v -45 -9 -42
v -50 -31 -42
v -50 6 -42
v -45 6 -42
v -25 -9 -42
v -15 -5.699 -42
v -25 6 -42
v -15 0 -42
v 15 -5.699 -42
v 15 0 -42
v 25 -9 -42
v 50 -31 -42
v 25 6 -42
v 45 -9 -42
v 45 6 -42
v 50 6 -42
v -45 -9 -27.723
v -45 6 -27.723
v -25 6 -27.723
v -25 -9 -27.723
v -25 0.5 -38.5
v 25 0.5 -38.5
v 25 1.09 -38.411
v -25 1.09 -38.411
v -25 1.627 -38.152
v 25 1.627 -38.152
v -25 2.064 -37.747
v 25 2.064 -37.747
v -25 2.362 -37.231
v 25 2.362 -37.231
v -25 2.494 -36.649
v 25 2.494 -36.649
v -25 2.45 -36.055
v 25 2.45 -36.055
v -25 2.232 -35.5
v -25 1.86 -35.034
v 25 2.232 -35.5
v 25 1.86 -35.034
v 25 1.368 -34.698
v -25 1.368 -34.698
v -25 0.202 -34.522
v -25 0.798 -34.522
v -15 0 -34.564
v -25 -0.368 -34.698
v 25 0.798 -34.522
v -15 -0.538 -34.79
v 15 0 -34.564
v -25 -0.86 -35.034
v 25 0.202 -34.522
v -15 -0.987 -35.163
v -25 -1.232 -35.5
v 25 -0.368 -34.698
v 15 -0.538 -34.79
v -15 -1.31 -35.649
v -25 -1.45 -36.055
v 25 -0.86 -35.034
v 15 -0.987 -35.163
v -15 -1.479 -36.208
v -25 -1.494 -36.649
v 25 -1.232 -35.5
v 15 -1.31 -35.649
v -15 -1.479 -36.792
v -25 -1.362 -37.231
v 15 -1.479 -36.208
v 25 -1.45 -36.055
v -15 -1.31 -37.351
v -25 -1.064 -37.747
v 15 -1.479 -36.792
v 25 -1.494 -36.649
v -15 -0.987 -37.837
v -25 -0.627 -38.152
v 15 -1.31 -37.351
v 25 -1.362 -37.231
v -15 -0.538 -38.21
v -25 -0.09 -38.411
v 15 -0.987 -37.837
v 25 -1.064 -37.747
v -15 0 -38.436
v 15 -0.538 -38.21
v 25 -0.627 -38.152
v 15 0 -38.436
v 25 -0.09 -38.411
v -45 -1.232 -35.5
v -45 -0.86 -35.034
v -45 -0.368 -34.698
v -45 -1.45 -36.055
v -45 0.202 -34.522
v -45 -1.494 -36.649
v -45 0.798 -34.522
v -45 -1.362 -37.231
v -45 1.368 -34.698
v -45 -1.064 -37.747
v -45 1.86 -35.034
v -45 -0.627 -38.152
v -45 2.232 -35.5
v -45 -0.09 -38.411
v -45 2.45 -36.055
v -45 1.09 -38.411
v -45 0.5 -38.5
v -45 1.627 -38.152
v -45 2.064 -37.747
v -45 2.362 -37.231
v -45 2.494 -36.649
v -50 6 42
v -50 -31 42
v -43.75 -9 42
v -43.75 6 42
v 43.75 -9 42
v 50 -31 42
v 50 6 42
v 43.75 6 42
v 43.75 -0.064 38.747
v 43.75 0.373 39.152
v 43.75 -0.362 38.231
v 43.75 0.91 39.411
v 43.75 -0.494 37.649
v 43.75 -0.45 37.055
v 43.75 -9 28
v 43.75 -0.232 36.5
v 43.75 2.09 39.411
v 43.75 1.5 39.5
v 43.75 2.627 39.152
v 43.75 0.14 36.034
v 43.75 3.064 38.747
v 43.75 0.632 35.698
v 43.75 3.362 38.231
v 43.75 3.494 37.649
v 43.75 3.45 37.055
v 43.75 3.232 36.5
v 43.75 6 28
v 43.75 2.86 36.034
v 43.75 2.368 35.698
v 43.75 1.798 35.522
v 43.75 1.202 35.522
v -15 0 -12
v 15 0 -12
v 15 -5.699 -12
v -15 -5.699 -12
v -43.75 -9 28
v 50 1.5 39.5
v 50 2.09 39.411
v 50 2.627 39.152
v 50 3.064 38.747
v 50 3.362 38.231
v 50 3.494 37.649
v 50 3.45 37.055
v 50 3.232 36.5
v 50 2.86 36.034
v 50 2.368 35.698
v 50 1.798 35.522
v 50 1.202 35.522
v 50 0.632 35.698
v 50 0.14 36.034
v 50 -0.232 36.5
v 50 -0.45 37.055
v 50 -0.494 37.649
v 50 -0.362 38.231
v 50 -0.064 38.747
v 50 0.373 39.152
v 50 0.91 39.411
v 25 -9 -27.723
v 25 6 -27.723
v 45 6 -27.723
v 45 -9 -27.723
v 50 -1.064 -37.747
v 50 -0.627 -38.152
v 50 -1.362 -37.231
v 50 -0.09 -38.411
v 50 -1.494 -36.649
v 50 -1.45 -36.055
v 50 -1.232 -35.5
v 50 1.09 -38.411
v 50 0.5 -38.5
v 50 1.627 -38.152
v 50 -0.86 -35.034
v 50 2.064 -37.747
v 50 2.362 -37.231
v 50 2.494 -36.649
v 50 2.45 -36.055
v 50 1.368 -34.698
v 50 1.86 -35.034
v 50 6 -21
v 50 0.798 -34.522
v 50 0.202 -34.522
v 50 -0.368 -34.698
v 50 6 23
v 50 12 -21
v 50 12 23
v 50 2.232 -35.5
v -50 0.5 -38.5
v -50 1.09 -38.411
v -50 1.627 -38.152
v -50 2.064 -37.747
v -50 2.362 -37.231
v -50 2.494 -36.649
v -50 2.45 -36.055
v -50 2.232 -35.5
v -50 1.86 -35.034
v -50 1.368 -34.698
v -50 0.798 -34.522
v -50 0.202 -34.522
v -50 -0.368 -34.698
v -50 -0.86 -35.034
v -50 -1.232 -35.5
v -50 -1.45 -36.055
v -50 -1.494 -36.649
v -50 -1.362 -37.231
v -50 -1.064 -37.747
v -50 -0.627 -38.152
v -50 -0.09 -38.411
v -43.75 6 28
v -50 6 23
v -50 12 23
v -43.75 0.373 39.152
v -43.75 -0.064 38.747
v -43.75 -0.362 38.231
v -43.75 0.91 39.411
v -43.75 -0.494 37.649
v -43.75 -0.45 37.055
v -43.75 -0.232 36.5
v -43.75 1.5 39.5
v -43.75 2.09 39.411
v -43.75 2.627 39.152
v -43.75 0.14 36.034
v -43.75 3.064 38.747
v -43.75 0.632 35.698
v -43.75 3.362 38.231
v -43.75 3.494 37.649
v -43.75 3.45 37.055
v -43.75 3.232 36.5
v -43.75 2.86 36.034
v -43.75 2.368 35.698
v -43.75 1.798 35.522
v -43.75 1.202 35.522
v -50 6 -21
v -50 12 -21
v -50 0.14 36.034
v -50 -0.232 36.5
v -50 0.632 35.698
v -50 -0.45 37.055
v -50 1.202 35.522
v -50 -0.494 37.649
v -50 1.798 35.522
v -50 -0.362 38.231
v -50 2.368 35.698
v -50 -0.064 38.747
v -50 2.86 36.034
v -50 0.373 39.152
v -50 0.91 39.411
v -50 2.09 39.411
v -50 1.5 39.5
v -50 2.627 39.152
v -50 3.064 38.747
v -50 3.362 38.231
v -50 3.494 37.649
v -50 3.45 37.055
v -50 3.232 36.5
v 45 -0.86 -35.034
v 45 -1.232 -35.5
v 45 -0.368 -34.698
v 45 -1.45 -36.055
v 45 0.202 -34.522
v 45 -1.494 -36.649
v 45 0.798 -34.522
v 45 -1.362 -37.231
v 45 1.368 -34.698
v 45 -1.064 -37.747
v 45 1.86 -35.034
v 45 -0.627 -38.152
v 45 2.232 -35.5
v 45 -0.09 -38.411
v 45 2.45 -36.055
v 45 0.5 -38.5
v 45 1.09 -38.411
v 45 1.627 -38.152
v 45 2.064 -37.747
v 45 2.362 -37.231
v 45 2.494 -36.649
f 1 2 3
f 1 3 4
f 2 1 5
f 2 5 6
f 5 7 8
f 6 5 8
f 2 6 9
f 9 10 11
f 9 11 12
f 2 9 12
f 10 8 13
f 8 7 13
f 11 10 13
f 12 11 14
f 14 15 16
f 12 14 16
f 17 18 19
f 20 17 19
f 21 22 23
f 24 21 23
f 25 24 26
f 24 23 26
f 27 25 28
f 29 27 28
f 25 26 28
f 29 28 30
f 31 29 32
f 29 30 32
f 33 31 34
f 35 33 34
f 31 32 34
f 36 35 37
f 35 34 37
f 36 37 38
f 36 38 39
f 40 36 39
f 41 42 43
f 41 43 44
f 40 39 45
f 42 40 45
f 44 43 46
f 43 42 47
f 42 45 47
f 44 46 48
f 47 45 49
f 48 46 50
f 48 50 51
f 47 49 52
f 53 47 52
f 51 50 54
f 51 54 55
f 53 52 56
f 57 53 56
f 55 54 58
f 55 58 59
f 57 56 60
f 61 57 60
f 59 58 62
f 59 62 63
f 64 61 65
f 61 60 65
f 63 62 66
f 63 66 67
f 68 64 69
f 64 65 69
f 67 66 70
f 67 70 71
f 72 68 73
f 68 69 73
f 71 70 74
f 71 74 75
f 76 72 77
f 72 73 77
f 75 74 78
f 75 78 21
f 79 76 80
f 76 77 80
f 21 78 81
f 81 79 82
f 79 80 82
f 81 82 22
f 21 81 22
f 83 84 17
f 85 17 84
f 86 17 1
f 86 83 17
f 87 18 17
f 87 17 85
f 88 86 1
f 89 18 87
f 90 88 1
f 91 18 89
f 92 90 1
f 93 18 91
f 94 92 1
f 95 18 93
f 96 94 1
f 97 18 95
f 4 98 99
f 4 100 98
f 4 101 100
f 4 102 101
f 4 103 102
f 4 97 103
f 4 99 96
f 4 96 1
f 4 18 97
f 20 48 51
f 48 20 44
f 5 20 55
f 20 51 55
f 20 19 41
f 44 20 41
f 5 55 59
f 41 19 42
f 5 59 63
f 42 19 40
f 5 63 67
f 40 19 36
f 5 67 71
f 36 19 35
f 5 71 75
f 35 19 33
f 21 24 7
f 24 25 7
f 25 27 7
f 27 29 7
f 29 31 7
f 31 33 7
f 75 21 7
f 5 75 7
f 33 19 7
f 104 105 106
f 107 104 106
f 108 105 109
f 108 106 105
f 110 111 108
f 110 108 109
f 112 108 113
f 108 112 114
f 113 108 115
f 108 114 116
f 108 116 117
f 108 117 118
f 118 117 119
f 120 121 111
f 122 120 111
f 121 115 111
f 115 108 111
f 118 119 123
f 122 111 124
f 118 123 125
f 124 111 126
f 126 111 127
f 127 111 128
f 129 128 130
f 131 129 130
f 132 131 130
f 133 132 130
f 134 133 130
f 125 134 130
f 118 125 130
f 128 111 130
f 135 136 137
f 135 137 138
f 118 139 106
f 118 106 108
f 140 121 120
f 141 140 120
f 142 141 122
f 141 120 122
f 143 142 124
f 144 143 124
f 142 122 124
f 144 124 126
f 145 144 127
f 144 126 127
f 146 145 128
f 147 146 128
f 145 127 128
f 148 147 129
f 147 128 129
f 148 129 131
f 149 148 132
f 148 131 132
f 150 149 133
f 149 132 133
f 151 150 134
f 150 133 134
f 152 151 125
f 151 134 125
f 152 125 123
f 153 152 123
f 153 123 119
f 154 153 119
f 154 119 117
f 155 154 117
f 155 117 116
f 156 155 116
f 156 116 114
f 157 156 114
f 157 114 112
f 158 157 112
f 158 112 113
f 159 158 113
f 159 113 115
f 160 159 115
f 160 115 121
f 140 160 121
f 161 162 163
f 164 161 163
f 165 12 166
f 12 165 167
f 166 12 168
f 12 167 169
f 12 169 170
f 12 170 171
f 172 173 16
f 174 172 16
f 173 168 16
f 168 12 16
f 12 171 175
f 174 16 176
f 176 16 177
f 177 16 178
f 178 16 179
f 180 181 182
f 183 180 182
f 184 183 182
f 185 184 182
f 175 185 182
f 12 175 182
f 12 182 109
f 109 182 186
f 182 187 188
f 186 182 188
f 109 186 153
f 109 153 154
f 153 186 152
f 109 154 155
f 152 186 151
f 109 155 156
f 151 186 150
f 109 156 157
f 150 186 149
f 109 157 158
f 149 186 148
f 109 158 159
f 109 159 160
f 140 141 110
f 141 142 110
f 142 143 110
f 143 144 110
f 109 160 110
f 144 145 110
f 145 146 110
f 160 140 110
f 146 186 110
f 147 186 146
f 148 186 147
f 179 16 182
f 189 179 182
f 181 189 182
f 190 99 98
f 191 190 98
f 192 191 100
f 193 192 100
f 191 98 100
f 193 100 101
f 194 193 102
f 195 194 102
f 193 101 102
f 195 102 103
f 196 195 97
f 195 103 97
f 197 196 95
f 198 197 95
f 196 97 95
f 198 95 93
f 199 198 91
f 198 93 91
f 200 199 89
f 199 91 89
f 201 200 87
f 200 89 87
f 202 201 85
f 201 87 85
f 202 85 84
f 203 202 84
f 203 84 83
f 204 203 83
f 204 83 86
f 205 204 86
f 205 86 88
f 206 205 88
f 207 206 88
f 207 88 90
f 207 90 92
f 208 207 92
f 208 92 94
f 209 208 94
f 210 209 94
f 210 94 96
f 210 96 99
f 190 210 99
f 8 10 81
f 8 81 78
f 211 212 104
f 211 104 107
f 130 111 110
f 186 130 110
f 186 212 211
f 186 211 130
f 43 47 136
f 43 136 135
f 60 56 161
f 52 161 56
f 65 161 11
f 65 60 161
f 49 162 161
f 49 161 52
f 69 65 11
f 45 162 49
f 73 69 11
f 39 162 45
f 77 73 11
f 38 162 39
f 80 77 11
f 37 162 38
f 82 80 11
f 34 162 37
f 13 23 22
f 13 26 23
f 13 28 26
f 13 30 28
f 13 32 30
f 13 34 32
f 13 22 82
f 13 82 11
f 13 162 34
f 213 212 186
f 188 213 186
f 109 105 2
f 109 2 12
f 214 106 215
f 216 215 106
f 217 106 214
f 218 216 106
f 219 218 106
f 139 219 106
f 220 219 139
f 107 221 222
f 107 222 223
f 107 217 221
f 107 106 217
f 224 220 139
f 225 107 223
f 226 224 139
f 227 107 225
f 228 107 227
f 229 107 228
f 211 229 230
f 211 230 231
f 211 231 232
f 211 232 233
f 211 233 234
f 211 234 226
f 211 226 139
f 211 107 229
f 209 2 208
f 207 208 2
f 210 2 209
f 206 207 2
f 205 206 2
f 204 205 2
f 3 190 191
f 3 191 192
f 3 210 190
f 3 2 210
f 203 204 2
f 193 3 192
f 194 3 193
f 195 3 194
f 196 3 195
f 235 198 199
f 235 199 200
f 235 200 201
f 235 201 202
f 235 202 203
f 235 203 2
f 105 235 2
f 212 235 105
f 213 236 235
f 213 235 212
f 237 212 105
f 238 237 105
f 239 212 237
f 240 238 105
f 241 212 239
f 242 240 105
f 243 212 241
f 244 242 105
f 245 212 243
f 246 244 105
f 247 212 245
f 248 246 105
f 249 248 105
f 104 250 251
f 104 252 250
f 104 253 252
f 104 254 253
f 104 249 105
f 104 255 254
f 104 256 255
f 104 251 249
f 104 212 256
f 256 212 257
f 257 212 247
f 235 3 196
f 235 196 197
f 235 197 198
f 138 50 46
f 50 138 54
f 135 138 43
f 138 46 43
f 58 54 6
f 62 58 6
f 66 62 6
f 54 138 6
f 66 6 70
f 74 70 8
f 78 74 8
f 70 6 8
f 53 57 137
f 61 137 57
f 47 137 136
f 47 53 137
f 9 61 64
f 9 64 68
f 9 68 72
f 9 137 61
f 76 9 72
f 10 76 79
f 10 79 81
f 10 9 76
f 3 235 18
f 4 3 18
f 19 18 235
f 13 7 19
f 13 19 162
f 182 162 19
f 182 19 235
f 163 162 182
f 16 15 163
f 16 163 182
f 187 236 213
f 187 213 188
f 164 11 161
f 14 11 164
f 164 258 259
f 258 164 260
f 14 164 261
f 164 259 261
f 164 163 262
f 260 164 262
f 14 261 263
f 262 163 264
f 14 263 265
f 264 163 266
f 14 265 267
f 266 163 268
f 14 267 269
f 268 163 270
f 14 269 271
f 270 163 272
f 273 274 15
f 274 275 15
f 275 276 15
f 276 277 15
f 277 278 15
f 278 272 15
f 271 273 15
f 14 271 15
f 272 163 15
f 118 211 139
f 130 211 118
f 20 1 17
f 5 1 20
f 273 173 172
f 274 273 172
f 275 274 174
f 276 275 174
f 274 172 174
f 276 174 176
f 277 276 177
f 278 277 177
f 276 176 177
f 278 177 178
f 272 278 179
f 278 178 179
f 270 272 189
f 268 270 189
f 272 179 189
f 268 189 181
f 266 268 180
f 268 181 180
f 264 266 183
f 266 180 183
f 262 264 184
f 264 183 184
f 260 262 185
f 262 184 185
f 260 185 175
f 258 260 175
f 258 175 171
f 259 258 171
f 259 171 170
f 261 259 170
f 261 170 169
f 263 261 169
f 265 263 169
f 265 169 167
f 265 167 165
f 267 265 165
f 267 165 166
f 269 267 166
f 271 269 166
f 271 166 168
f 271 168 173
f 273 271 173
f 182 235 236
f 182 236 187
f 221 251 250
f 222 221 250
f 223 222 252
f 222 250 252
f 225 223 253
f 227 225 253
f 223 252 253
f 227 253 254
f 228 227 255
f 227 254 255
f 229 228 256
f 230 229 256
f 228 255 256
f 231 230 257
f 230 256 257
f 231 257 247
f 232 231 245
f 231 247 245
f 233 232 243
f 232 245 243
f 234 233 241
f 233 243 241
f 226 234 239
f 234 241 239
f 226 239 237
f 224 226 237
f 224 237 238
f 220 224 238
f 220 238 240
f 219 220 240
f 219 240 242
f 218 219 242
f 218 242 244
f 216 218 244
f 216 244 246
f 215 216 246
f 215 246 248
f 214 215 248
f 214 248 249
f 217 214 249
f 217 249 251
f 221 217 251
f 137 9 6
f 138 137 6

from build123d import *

# Parameters (mm, degrees)
SKETCH1_W           = 100
SKETCH1_H           = 84
BOSS_EXTRUDE1_DEPTH = 6
SKETCH2_W           = 100
SKETCH2_H           = 44
BOSS_EXTRUDE2_DEPTH = 6
SKETCH3_W           = 100
SKETCH3_H           = 84
BOSS_EXTRUDE3_DEPTH = 31
SKETCH4_W           = 30
SKETCH4_H           = 5.699357211
CUT_EXTRUDE1_DEPTH  = 30
SKETCH5_R           = 2
CUT_EXTRUDE2_DEPTH  = 113.805141727
SKETCH6_W           = 87.5
SKETCH6_H           = 26
CUT_EXTRUDE3_DEPTH  = 15
SKETCH7_R           = 2
CUT_EXTRUDE4_DEPTH  = 113.805141727
SKETCH8_W           = 20
SKETCH8_H           = 14.276989135
CUT_EXTRUDE5_DEPTH  = 15


with BuildPart() as part:
    # Sketch1 → Boss-Extrude1 (new body)
    with BuildSketch(Plane(origin=(0, 0, 0), x_dir=(1, 0, 0), z_dir=(0, 1, 0))):
        Rectangle(SKETCH1_W, SKETCH1_H)
    extrude(amount=BOSS_EXTRUDE1_DEPTH)

    # Sketch2 → Boss-Extrude2 (add)
    with BuildSketch(Plane(origin=(0, 6, 0), x_dir=(1, 0, 0), z_dir=(0, 1, 0))):
        with Locations((0, -1)):
            Rectangle(SKETCH2_W, SKETCH2_H)
    extrude(amount=BOSS_EXTRUDE2_DEPTH)

    # Sketch3 → Boss-Extrude3 (add)
    with BuildSketch(Plane.XZ):
        Rectangle(SKETCH3_W, SKETCH3_H)
    extrude(amount=BOSS_EXTRUDE3_DEPTH)

    # Sketch4 → Cut-Extrude1 (cut)
    with BuildSketch(Plane(origin=(0, 0, -42), x_dir=(-1, 0, 0), z_dir=(0, 0, -1))):
        with Locations((0, -2.849678606)):
            Rectangle(SKETCH4_W, SKETCH4_H)
    extrude(amount=-CUT_EXTRUDE1_DEPTH, mode=Mode.SUBTRACT)

    # Sketch5 → Cut-Extrude2 (cut, through all)
    with BuildSketch(Plane.ZY.offset(50)):
        with Locations((37.5, 1.5)):
            Circle(SKETCH5_R)
    extrude(amount=-CUT_EXTRUDE2_DEPTH, mode=Mode.SUBTRACT)

    # Sketch6 → Cut-Extrude3 (cut)
    with BuildSketch(Plane(origin=(0, 6, 0), x_dir=(1, 0, 0), z_dir=(0, 1, 0))):
        with Locations((0, -41)):
            Rectangle(SKETCH6_W, SKETCH6_H)
    extrude(amount=-CUT_EXTRUDE3_DEPTH, mode=Mode.SUBTRACT)

    # Sketch7 → Cut-Extrude4 (cut, through all)
    with BuildSketch(Plane(origin=(50, 0, 0), x_dir=(0, 0, -1), z_dir=(1, 0, 0))):
        with Locations((36.5, 0.5)):
            Circle(SKETCH7_R)
    extrude(amount=-CUT_EXTRUDE4_DEPTH, mode=Mode.SUBTRACT)

    # Sketch8 → Cut-Extrude5 (cut)
    with BuildSketch(Plane(origin=(0, 6, 0), x_dir=(1, 0, 0), z_dir=(0, 1, 0))):
        with Locations((-35, 34.861505433)):
            Rectangle(SKETCH8_W, SKETCH8_H)
        with Locations((35, 34.861505433)):
            Rectangle(SKETCH8_W, SKETCH8_H)
    extrude(amount=-CUT_EXTRUDE5_DEPTH, mode=Mode.SUBTRACT)


solid = part.part
